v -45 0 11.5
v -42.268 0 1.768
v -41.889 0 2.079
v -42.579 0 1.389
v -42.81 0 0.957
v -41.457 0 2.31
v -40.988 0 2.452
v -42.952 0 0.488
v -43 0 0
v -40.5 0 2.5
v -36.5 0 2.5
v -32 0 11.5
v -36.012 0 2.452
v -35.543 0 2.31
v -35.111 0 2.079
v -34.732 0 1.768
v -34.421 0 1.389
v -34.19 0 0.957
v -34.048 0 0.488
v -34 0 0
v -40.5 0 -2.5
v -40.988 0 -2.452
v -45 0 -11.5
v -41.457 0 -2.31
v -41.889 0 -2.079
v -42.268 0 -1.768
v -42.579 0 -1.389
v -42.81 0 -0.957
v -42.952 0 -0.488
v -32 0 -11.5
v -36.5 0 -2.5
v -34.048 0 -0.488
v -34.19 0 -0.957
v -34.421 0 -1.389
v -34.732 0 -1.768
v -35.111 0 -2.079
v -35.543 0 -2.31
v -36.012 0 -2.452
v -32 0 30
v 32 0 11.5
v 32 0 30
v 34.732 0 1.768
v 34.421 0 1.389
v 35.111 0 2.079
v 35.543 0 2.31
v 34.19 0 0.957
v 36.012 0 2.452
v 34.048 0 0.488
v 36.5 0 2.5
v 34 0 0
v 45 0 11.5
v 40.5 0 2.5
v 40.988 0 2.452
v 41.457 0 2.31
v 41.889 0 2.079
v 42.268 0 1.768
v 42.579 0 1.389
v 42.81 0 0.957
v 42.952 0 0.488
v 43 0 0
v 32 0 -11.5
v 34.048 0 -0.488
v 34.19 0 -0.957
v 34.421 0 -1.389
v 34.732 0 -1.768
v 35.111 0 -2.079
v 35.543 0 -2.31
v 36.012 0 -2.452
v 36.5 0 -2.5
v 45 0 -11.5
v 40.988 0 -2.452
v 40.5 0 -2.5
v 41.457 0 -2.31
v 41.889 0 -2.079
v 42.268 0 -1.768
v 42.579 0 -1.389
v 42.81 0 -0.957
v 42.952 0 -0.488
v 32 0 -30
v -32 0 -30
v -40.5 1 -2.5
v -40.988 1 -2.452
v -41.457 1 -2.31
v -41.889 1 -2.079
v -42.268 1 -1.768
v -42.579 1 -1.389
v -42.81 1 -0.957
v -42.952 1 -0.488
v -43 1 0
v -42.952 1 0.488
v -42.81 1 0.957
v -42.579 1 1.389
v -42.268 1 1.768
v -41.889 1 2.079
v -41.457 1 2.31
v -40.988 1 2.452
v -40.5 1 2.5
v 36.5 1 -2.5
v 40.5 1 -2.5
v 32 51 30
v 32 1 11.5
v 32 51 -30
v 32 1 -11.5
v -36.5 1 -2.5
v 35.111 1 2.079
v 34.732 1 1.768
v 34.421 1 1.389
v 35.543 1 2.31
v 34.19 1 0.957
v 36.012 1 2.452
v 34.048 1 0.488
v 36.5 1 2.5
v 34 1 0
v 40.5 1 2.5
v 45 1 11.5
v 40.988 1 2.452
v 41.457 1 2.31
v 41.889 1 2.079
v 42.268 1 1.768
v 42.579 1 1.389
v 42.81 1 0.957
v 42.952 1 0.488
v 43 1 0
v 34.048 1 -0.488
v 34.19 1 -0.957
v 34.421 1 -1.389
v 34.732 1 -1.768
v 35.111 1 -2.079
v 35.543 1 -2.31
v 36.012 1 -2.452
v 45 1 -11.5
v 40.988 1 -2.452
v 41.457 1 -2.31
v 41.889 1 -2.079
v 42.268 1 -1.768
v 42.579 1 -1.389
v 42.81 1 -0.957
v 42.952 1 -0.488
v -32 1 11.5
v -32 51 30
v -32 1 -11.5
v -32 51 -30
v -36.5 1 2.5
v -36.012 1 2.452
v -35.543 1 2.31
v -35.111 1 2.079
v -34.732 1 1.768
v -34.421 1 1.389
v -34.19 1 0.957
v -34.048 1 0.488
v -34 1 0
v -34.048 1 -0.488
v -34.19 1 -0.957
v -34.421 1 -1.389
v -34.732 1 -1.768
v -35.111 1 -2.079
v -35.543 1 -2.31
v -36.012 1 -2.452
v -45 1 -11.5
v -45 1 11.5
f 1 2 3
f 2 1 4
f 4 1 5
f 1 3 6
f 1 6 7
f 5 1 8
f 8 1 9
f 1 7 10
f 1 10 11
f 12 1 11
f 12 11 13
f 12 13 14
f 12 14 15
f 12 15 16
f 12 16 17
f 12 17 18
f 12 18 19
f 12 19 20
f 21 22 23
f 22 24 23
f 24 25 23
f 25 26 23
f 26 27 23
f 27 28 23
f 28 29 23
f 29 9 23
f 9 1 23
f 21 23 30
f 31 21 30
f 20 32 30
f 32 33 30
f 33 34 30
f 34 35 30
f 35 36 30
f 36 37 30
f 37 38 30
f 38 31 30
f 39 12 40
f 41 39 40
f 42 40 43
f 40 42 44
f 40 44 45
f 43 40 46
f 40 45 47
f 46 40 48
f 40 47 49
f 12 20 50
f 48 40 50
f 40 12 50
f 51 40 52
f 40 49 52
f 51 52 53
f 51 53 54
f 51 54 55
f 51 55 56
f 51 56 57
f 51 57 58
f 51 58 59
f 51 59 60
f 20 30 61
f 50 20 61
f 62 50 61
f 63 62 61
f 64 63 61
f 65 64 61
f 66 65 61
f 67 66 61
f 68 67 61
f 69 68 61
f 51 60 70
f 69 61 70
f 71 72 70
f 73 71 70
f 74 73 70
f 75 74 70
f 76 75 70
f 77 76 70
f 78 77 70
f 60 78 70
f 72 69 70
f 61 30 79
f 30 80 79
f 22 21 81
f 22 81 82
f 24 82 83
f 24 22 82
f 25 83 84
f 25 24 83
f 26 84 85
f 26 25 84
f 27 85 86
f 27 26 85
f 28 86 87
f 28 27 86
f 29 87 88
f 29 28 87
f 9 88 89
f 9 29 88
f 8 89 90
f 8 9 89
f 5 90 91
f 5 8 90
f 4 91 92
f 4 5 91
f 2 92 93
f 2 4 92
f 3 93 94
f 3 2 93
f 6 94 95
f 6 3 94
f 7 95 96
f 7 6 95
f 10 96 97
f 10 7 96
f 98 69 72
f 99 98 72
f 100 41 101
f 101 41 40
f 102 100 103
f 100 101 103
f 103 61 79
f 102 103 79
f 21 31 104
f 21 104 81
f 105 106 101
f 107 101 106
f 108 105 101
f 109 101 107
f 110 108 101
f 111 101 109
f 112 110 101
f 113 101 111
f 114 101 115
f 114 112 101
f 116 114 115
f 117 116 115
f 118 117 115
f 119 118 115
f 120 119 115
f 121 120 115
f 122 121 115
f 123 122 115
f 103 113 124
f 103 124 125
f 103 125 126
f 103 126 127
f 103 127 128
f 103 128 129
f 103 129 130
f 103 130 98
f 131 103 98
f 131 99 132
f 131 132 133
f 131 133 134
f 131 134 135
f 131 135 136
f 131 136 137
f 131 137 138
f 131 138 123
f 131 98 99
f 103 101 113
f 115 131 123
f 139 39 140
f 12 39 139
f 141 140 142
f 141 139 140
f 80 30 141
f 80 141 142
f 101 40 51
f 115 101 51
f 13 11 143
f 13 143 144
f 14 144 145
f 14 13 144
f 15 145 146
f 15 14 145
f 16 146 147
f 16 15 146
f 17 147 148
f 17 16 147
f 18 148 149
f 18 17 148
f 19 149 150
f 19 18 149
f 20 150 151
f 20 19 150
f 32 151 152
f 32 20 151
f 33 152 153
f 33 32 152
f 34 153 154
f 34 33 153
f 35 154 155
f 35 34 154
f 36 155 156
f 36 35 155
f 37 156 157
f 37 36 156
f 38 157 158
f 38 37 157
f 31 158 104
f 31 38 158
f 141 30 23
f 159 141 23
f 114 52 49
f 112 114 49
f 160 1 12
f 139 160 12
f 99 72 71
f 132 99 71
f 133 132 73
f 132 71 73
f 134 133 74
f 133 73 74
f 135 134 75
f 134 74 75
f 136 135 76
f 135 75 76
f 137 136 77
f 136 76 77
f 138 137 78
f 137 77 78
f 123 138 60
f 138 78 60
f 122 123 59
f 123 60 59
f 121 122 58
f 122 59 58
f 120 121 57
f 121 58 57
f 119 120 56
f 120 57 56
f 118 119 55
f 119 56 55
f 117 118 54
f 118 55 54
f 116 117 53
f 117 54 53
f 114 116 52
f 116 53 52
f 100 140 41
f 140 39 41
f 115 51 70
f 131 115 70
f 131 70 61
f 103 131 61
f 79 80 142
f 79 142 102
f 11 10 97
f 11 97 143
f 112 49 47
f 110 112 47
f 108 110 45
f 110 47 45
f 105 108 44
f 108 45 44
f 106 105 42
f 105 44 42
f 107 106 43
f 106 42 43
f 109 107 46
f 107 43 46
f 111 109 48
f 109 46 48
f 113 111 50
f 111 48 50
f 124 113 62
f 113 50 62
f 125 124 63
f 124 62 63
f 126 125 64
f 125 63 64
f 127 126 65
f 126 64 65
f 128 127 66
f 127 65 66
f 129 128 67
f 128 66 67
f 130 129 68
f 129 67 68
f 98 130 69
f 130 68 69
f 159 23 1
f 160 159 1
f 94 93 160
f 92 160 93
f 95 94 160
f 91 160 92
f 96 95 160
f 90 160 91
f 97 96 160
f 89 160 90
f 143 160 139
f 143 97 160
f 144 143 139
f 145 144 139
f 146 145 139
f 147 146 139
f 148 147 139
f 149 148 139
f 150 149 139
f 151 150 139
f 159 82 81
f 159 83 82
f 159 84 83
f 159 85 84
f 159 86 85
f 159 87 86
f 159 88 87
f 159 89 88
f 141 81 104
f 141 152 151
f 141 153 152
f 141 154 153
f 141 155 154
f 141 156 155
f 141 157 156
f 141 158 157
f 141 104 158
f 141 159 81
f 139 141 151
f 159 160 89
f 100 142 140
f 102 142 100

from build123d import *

# Parameters (mm, degrees)
SALIENTE_EXTRUIR1_DEPTH = 1
CROQUIS2_W              = 64
CROQUIS2_H              = 60
SALIENTE_EXTRUIR2_DEPTH = 50


with BuildPart() as part:
    # Croquis1 → Saliente-Extruir1 (new body)
    with BuildSketch(Plane(origin=(0, 0, 0), x_dir=(1, 0, 0), z_dir=(0, 1, 0))):
        Polygon((-32, 11.5), (-45, 11.5), (-45, -11.5), (-32, -11.5), (-32, -30), (32, -30), (32, -11.5), (45, -11.5), (45, 11.5), (32, 11.5), (32, 30), (-32, 30), align=None)
        with BuildLine():
            Line((-40.5, -2.5), (-36.5, -2.5))
            ThreePointArc((-36.5, -2.5), (-34, 0), (-36.5, 2.5))
            Line((-36.5, 2.5), (-40.5, 2.5))
            ThreePointArc((-40.5, 2.5), (-43, 0), (-40.5, -2.5))
        make_face(mode=Mode.SUBTRACT)
        with BuildLine():
            Line((40.5, -2.5), (36.5, -2.5))
            ThreePointArc((36.5, -2.5), (34, 0), (36.5, 2.5))
            Line((36.5, 2.5), (40.5, 2.5))
            ThreePointArc((40.5, 2.5), (43, 0), (40.5, -2.5))
        make_face(mode=Mode.SUBTRACT)
    extrude(amount=SALIENTE_EXTRUIR1_DEPTH)

    # Croquis2 → Saliente-Extruir2 (add)
    with BuildSketch(Plane(origin=(0, 1, 0), x_dir=(1, 0, 0), z_dir=(0, 1, 0))):
        Rectangle(CROQUIS2_W, CROQUIS2_H)
    extrude(amount=SALIENTE_EXTRUIR2_DEPTH)


solid = part.part
